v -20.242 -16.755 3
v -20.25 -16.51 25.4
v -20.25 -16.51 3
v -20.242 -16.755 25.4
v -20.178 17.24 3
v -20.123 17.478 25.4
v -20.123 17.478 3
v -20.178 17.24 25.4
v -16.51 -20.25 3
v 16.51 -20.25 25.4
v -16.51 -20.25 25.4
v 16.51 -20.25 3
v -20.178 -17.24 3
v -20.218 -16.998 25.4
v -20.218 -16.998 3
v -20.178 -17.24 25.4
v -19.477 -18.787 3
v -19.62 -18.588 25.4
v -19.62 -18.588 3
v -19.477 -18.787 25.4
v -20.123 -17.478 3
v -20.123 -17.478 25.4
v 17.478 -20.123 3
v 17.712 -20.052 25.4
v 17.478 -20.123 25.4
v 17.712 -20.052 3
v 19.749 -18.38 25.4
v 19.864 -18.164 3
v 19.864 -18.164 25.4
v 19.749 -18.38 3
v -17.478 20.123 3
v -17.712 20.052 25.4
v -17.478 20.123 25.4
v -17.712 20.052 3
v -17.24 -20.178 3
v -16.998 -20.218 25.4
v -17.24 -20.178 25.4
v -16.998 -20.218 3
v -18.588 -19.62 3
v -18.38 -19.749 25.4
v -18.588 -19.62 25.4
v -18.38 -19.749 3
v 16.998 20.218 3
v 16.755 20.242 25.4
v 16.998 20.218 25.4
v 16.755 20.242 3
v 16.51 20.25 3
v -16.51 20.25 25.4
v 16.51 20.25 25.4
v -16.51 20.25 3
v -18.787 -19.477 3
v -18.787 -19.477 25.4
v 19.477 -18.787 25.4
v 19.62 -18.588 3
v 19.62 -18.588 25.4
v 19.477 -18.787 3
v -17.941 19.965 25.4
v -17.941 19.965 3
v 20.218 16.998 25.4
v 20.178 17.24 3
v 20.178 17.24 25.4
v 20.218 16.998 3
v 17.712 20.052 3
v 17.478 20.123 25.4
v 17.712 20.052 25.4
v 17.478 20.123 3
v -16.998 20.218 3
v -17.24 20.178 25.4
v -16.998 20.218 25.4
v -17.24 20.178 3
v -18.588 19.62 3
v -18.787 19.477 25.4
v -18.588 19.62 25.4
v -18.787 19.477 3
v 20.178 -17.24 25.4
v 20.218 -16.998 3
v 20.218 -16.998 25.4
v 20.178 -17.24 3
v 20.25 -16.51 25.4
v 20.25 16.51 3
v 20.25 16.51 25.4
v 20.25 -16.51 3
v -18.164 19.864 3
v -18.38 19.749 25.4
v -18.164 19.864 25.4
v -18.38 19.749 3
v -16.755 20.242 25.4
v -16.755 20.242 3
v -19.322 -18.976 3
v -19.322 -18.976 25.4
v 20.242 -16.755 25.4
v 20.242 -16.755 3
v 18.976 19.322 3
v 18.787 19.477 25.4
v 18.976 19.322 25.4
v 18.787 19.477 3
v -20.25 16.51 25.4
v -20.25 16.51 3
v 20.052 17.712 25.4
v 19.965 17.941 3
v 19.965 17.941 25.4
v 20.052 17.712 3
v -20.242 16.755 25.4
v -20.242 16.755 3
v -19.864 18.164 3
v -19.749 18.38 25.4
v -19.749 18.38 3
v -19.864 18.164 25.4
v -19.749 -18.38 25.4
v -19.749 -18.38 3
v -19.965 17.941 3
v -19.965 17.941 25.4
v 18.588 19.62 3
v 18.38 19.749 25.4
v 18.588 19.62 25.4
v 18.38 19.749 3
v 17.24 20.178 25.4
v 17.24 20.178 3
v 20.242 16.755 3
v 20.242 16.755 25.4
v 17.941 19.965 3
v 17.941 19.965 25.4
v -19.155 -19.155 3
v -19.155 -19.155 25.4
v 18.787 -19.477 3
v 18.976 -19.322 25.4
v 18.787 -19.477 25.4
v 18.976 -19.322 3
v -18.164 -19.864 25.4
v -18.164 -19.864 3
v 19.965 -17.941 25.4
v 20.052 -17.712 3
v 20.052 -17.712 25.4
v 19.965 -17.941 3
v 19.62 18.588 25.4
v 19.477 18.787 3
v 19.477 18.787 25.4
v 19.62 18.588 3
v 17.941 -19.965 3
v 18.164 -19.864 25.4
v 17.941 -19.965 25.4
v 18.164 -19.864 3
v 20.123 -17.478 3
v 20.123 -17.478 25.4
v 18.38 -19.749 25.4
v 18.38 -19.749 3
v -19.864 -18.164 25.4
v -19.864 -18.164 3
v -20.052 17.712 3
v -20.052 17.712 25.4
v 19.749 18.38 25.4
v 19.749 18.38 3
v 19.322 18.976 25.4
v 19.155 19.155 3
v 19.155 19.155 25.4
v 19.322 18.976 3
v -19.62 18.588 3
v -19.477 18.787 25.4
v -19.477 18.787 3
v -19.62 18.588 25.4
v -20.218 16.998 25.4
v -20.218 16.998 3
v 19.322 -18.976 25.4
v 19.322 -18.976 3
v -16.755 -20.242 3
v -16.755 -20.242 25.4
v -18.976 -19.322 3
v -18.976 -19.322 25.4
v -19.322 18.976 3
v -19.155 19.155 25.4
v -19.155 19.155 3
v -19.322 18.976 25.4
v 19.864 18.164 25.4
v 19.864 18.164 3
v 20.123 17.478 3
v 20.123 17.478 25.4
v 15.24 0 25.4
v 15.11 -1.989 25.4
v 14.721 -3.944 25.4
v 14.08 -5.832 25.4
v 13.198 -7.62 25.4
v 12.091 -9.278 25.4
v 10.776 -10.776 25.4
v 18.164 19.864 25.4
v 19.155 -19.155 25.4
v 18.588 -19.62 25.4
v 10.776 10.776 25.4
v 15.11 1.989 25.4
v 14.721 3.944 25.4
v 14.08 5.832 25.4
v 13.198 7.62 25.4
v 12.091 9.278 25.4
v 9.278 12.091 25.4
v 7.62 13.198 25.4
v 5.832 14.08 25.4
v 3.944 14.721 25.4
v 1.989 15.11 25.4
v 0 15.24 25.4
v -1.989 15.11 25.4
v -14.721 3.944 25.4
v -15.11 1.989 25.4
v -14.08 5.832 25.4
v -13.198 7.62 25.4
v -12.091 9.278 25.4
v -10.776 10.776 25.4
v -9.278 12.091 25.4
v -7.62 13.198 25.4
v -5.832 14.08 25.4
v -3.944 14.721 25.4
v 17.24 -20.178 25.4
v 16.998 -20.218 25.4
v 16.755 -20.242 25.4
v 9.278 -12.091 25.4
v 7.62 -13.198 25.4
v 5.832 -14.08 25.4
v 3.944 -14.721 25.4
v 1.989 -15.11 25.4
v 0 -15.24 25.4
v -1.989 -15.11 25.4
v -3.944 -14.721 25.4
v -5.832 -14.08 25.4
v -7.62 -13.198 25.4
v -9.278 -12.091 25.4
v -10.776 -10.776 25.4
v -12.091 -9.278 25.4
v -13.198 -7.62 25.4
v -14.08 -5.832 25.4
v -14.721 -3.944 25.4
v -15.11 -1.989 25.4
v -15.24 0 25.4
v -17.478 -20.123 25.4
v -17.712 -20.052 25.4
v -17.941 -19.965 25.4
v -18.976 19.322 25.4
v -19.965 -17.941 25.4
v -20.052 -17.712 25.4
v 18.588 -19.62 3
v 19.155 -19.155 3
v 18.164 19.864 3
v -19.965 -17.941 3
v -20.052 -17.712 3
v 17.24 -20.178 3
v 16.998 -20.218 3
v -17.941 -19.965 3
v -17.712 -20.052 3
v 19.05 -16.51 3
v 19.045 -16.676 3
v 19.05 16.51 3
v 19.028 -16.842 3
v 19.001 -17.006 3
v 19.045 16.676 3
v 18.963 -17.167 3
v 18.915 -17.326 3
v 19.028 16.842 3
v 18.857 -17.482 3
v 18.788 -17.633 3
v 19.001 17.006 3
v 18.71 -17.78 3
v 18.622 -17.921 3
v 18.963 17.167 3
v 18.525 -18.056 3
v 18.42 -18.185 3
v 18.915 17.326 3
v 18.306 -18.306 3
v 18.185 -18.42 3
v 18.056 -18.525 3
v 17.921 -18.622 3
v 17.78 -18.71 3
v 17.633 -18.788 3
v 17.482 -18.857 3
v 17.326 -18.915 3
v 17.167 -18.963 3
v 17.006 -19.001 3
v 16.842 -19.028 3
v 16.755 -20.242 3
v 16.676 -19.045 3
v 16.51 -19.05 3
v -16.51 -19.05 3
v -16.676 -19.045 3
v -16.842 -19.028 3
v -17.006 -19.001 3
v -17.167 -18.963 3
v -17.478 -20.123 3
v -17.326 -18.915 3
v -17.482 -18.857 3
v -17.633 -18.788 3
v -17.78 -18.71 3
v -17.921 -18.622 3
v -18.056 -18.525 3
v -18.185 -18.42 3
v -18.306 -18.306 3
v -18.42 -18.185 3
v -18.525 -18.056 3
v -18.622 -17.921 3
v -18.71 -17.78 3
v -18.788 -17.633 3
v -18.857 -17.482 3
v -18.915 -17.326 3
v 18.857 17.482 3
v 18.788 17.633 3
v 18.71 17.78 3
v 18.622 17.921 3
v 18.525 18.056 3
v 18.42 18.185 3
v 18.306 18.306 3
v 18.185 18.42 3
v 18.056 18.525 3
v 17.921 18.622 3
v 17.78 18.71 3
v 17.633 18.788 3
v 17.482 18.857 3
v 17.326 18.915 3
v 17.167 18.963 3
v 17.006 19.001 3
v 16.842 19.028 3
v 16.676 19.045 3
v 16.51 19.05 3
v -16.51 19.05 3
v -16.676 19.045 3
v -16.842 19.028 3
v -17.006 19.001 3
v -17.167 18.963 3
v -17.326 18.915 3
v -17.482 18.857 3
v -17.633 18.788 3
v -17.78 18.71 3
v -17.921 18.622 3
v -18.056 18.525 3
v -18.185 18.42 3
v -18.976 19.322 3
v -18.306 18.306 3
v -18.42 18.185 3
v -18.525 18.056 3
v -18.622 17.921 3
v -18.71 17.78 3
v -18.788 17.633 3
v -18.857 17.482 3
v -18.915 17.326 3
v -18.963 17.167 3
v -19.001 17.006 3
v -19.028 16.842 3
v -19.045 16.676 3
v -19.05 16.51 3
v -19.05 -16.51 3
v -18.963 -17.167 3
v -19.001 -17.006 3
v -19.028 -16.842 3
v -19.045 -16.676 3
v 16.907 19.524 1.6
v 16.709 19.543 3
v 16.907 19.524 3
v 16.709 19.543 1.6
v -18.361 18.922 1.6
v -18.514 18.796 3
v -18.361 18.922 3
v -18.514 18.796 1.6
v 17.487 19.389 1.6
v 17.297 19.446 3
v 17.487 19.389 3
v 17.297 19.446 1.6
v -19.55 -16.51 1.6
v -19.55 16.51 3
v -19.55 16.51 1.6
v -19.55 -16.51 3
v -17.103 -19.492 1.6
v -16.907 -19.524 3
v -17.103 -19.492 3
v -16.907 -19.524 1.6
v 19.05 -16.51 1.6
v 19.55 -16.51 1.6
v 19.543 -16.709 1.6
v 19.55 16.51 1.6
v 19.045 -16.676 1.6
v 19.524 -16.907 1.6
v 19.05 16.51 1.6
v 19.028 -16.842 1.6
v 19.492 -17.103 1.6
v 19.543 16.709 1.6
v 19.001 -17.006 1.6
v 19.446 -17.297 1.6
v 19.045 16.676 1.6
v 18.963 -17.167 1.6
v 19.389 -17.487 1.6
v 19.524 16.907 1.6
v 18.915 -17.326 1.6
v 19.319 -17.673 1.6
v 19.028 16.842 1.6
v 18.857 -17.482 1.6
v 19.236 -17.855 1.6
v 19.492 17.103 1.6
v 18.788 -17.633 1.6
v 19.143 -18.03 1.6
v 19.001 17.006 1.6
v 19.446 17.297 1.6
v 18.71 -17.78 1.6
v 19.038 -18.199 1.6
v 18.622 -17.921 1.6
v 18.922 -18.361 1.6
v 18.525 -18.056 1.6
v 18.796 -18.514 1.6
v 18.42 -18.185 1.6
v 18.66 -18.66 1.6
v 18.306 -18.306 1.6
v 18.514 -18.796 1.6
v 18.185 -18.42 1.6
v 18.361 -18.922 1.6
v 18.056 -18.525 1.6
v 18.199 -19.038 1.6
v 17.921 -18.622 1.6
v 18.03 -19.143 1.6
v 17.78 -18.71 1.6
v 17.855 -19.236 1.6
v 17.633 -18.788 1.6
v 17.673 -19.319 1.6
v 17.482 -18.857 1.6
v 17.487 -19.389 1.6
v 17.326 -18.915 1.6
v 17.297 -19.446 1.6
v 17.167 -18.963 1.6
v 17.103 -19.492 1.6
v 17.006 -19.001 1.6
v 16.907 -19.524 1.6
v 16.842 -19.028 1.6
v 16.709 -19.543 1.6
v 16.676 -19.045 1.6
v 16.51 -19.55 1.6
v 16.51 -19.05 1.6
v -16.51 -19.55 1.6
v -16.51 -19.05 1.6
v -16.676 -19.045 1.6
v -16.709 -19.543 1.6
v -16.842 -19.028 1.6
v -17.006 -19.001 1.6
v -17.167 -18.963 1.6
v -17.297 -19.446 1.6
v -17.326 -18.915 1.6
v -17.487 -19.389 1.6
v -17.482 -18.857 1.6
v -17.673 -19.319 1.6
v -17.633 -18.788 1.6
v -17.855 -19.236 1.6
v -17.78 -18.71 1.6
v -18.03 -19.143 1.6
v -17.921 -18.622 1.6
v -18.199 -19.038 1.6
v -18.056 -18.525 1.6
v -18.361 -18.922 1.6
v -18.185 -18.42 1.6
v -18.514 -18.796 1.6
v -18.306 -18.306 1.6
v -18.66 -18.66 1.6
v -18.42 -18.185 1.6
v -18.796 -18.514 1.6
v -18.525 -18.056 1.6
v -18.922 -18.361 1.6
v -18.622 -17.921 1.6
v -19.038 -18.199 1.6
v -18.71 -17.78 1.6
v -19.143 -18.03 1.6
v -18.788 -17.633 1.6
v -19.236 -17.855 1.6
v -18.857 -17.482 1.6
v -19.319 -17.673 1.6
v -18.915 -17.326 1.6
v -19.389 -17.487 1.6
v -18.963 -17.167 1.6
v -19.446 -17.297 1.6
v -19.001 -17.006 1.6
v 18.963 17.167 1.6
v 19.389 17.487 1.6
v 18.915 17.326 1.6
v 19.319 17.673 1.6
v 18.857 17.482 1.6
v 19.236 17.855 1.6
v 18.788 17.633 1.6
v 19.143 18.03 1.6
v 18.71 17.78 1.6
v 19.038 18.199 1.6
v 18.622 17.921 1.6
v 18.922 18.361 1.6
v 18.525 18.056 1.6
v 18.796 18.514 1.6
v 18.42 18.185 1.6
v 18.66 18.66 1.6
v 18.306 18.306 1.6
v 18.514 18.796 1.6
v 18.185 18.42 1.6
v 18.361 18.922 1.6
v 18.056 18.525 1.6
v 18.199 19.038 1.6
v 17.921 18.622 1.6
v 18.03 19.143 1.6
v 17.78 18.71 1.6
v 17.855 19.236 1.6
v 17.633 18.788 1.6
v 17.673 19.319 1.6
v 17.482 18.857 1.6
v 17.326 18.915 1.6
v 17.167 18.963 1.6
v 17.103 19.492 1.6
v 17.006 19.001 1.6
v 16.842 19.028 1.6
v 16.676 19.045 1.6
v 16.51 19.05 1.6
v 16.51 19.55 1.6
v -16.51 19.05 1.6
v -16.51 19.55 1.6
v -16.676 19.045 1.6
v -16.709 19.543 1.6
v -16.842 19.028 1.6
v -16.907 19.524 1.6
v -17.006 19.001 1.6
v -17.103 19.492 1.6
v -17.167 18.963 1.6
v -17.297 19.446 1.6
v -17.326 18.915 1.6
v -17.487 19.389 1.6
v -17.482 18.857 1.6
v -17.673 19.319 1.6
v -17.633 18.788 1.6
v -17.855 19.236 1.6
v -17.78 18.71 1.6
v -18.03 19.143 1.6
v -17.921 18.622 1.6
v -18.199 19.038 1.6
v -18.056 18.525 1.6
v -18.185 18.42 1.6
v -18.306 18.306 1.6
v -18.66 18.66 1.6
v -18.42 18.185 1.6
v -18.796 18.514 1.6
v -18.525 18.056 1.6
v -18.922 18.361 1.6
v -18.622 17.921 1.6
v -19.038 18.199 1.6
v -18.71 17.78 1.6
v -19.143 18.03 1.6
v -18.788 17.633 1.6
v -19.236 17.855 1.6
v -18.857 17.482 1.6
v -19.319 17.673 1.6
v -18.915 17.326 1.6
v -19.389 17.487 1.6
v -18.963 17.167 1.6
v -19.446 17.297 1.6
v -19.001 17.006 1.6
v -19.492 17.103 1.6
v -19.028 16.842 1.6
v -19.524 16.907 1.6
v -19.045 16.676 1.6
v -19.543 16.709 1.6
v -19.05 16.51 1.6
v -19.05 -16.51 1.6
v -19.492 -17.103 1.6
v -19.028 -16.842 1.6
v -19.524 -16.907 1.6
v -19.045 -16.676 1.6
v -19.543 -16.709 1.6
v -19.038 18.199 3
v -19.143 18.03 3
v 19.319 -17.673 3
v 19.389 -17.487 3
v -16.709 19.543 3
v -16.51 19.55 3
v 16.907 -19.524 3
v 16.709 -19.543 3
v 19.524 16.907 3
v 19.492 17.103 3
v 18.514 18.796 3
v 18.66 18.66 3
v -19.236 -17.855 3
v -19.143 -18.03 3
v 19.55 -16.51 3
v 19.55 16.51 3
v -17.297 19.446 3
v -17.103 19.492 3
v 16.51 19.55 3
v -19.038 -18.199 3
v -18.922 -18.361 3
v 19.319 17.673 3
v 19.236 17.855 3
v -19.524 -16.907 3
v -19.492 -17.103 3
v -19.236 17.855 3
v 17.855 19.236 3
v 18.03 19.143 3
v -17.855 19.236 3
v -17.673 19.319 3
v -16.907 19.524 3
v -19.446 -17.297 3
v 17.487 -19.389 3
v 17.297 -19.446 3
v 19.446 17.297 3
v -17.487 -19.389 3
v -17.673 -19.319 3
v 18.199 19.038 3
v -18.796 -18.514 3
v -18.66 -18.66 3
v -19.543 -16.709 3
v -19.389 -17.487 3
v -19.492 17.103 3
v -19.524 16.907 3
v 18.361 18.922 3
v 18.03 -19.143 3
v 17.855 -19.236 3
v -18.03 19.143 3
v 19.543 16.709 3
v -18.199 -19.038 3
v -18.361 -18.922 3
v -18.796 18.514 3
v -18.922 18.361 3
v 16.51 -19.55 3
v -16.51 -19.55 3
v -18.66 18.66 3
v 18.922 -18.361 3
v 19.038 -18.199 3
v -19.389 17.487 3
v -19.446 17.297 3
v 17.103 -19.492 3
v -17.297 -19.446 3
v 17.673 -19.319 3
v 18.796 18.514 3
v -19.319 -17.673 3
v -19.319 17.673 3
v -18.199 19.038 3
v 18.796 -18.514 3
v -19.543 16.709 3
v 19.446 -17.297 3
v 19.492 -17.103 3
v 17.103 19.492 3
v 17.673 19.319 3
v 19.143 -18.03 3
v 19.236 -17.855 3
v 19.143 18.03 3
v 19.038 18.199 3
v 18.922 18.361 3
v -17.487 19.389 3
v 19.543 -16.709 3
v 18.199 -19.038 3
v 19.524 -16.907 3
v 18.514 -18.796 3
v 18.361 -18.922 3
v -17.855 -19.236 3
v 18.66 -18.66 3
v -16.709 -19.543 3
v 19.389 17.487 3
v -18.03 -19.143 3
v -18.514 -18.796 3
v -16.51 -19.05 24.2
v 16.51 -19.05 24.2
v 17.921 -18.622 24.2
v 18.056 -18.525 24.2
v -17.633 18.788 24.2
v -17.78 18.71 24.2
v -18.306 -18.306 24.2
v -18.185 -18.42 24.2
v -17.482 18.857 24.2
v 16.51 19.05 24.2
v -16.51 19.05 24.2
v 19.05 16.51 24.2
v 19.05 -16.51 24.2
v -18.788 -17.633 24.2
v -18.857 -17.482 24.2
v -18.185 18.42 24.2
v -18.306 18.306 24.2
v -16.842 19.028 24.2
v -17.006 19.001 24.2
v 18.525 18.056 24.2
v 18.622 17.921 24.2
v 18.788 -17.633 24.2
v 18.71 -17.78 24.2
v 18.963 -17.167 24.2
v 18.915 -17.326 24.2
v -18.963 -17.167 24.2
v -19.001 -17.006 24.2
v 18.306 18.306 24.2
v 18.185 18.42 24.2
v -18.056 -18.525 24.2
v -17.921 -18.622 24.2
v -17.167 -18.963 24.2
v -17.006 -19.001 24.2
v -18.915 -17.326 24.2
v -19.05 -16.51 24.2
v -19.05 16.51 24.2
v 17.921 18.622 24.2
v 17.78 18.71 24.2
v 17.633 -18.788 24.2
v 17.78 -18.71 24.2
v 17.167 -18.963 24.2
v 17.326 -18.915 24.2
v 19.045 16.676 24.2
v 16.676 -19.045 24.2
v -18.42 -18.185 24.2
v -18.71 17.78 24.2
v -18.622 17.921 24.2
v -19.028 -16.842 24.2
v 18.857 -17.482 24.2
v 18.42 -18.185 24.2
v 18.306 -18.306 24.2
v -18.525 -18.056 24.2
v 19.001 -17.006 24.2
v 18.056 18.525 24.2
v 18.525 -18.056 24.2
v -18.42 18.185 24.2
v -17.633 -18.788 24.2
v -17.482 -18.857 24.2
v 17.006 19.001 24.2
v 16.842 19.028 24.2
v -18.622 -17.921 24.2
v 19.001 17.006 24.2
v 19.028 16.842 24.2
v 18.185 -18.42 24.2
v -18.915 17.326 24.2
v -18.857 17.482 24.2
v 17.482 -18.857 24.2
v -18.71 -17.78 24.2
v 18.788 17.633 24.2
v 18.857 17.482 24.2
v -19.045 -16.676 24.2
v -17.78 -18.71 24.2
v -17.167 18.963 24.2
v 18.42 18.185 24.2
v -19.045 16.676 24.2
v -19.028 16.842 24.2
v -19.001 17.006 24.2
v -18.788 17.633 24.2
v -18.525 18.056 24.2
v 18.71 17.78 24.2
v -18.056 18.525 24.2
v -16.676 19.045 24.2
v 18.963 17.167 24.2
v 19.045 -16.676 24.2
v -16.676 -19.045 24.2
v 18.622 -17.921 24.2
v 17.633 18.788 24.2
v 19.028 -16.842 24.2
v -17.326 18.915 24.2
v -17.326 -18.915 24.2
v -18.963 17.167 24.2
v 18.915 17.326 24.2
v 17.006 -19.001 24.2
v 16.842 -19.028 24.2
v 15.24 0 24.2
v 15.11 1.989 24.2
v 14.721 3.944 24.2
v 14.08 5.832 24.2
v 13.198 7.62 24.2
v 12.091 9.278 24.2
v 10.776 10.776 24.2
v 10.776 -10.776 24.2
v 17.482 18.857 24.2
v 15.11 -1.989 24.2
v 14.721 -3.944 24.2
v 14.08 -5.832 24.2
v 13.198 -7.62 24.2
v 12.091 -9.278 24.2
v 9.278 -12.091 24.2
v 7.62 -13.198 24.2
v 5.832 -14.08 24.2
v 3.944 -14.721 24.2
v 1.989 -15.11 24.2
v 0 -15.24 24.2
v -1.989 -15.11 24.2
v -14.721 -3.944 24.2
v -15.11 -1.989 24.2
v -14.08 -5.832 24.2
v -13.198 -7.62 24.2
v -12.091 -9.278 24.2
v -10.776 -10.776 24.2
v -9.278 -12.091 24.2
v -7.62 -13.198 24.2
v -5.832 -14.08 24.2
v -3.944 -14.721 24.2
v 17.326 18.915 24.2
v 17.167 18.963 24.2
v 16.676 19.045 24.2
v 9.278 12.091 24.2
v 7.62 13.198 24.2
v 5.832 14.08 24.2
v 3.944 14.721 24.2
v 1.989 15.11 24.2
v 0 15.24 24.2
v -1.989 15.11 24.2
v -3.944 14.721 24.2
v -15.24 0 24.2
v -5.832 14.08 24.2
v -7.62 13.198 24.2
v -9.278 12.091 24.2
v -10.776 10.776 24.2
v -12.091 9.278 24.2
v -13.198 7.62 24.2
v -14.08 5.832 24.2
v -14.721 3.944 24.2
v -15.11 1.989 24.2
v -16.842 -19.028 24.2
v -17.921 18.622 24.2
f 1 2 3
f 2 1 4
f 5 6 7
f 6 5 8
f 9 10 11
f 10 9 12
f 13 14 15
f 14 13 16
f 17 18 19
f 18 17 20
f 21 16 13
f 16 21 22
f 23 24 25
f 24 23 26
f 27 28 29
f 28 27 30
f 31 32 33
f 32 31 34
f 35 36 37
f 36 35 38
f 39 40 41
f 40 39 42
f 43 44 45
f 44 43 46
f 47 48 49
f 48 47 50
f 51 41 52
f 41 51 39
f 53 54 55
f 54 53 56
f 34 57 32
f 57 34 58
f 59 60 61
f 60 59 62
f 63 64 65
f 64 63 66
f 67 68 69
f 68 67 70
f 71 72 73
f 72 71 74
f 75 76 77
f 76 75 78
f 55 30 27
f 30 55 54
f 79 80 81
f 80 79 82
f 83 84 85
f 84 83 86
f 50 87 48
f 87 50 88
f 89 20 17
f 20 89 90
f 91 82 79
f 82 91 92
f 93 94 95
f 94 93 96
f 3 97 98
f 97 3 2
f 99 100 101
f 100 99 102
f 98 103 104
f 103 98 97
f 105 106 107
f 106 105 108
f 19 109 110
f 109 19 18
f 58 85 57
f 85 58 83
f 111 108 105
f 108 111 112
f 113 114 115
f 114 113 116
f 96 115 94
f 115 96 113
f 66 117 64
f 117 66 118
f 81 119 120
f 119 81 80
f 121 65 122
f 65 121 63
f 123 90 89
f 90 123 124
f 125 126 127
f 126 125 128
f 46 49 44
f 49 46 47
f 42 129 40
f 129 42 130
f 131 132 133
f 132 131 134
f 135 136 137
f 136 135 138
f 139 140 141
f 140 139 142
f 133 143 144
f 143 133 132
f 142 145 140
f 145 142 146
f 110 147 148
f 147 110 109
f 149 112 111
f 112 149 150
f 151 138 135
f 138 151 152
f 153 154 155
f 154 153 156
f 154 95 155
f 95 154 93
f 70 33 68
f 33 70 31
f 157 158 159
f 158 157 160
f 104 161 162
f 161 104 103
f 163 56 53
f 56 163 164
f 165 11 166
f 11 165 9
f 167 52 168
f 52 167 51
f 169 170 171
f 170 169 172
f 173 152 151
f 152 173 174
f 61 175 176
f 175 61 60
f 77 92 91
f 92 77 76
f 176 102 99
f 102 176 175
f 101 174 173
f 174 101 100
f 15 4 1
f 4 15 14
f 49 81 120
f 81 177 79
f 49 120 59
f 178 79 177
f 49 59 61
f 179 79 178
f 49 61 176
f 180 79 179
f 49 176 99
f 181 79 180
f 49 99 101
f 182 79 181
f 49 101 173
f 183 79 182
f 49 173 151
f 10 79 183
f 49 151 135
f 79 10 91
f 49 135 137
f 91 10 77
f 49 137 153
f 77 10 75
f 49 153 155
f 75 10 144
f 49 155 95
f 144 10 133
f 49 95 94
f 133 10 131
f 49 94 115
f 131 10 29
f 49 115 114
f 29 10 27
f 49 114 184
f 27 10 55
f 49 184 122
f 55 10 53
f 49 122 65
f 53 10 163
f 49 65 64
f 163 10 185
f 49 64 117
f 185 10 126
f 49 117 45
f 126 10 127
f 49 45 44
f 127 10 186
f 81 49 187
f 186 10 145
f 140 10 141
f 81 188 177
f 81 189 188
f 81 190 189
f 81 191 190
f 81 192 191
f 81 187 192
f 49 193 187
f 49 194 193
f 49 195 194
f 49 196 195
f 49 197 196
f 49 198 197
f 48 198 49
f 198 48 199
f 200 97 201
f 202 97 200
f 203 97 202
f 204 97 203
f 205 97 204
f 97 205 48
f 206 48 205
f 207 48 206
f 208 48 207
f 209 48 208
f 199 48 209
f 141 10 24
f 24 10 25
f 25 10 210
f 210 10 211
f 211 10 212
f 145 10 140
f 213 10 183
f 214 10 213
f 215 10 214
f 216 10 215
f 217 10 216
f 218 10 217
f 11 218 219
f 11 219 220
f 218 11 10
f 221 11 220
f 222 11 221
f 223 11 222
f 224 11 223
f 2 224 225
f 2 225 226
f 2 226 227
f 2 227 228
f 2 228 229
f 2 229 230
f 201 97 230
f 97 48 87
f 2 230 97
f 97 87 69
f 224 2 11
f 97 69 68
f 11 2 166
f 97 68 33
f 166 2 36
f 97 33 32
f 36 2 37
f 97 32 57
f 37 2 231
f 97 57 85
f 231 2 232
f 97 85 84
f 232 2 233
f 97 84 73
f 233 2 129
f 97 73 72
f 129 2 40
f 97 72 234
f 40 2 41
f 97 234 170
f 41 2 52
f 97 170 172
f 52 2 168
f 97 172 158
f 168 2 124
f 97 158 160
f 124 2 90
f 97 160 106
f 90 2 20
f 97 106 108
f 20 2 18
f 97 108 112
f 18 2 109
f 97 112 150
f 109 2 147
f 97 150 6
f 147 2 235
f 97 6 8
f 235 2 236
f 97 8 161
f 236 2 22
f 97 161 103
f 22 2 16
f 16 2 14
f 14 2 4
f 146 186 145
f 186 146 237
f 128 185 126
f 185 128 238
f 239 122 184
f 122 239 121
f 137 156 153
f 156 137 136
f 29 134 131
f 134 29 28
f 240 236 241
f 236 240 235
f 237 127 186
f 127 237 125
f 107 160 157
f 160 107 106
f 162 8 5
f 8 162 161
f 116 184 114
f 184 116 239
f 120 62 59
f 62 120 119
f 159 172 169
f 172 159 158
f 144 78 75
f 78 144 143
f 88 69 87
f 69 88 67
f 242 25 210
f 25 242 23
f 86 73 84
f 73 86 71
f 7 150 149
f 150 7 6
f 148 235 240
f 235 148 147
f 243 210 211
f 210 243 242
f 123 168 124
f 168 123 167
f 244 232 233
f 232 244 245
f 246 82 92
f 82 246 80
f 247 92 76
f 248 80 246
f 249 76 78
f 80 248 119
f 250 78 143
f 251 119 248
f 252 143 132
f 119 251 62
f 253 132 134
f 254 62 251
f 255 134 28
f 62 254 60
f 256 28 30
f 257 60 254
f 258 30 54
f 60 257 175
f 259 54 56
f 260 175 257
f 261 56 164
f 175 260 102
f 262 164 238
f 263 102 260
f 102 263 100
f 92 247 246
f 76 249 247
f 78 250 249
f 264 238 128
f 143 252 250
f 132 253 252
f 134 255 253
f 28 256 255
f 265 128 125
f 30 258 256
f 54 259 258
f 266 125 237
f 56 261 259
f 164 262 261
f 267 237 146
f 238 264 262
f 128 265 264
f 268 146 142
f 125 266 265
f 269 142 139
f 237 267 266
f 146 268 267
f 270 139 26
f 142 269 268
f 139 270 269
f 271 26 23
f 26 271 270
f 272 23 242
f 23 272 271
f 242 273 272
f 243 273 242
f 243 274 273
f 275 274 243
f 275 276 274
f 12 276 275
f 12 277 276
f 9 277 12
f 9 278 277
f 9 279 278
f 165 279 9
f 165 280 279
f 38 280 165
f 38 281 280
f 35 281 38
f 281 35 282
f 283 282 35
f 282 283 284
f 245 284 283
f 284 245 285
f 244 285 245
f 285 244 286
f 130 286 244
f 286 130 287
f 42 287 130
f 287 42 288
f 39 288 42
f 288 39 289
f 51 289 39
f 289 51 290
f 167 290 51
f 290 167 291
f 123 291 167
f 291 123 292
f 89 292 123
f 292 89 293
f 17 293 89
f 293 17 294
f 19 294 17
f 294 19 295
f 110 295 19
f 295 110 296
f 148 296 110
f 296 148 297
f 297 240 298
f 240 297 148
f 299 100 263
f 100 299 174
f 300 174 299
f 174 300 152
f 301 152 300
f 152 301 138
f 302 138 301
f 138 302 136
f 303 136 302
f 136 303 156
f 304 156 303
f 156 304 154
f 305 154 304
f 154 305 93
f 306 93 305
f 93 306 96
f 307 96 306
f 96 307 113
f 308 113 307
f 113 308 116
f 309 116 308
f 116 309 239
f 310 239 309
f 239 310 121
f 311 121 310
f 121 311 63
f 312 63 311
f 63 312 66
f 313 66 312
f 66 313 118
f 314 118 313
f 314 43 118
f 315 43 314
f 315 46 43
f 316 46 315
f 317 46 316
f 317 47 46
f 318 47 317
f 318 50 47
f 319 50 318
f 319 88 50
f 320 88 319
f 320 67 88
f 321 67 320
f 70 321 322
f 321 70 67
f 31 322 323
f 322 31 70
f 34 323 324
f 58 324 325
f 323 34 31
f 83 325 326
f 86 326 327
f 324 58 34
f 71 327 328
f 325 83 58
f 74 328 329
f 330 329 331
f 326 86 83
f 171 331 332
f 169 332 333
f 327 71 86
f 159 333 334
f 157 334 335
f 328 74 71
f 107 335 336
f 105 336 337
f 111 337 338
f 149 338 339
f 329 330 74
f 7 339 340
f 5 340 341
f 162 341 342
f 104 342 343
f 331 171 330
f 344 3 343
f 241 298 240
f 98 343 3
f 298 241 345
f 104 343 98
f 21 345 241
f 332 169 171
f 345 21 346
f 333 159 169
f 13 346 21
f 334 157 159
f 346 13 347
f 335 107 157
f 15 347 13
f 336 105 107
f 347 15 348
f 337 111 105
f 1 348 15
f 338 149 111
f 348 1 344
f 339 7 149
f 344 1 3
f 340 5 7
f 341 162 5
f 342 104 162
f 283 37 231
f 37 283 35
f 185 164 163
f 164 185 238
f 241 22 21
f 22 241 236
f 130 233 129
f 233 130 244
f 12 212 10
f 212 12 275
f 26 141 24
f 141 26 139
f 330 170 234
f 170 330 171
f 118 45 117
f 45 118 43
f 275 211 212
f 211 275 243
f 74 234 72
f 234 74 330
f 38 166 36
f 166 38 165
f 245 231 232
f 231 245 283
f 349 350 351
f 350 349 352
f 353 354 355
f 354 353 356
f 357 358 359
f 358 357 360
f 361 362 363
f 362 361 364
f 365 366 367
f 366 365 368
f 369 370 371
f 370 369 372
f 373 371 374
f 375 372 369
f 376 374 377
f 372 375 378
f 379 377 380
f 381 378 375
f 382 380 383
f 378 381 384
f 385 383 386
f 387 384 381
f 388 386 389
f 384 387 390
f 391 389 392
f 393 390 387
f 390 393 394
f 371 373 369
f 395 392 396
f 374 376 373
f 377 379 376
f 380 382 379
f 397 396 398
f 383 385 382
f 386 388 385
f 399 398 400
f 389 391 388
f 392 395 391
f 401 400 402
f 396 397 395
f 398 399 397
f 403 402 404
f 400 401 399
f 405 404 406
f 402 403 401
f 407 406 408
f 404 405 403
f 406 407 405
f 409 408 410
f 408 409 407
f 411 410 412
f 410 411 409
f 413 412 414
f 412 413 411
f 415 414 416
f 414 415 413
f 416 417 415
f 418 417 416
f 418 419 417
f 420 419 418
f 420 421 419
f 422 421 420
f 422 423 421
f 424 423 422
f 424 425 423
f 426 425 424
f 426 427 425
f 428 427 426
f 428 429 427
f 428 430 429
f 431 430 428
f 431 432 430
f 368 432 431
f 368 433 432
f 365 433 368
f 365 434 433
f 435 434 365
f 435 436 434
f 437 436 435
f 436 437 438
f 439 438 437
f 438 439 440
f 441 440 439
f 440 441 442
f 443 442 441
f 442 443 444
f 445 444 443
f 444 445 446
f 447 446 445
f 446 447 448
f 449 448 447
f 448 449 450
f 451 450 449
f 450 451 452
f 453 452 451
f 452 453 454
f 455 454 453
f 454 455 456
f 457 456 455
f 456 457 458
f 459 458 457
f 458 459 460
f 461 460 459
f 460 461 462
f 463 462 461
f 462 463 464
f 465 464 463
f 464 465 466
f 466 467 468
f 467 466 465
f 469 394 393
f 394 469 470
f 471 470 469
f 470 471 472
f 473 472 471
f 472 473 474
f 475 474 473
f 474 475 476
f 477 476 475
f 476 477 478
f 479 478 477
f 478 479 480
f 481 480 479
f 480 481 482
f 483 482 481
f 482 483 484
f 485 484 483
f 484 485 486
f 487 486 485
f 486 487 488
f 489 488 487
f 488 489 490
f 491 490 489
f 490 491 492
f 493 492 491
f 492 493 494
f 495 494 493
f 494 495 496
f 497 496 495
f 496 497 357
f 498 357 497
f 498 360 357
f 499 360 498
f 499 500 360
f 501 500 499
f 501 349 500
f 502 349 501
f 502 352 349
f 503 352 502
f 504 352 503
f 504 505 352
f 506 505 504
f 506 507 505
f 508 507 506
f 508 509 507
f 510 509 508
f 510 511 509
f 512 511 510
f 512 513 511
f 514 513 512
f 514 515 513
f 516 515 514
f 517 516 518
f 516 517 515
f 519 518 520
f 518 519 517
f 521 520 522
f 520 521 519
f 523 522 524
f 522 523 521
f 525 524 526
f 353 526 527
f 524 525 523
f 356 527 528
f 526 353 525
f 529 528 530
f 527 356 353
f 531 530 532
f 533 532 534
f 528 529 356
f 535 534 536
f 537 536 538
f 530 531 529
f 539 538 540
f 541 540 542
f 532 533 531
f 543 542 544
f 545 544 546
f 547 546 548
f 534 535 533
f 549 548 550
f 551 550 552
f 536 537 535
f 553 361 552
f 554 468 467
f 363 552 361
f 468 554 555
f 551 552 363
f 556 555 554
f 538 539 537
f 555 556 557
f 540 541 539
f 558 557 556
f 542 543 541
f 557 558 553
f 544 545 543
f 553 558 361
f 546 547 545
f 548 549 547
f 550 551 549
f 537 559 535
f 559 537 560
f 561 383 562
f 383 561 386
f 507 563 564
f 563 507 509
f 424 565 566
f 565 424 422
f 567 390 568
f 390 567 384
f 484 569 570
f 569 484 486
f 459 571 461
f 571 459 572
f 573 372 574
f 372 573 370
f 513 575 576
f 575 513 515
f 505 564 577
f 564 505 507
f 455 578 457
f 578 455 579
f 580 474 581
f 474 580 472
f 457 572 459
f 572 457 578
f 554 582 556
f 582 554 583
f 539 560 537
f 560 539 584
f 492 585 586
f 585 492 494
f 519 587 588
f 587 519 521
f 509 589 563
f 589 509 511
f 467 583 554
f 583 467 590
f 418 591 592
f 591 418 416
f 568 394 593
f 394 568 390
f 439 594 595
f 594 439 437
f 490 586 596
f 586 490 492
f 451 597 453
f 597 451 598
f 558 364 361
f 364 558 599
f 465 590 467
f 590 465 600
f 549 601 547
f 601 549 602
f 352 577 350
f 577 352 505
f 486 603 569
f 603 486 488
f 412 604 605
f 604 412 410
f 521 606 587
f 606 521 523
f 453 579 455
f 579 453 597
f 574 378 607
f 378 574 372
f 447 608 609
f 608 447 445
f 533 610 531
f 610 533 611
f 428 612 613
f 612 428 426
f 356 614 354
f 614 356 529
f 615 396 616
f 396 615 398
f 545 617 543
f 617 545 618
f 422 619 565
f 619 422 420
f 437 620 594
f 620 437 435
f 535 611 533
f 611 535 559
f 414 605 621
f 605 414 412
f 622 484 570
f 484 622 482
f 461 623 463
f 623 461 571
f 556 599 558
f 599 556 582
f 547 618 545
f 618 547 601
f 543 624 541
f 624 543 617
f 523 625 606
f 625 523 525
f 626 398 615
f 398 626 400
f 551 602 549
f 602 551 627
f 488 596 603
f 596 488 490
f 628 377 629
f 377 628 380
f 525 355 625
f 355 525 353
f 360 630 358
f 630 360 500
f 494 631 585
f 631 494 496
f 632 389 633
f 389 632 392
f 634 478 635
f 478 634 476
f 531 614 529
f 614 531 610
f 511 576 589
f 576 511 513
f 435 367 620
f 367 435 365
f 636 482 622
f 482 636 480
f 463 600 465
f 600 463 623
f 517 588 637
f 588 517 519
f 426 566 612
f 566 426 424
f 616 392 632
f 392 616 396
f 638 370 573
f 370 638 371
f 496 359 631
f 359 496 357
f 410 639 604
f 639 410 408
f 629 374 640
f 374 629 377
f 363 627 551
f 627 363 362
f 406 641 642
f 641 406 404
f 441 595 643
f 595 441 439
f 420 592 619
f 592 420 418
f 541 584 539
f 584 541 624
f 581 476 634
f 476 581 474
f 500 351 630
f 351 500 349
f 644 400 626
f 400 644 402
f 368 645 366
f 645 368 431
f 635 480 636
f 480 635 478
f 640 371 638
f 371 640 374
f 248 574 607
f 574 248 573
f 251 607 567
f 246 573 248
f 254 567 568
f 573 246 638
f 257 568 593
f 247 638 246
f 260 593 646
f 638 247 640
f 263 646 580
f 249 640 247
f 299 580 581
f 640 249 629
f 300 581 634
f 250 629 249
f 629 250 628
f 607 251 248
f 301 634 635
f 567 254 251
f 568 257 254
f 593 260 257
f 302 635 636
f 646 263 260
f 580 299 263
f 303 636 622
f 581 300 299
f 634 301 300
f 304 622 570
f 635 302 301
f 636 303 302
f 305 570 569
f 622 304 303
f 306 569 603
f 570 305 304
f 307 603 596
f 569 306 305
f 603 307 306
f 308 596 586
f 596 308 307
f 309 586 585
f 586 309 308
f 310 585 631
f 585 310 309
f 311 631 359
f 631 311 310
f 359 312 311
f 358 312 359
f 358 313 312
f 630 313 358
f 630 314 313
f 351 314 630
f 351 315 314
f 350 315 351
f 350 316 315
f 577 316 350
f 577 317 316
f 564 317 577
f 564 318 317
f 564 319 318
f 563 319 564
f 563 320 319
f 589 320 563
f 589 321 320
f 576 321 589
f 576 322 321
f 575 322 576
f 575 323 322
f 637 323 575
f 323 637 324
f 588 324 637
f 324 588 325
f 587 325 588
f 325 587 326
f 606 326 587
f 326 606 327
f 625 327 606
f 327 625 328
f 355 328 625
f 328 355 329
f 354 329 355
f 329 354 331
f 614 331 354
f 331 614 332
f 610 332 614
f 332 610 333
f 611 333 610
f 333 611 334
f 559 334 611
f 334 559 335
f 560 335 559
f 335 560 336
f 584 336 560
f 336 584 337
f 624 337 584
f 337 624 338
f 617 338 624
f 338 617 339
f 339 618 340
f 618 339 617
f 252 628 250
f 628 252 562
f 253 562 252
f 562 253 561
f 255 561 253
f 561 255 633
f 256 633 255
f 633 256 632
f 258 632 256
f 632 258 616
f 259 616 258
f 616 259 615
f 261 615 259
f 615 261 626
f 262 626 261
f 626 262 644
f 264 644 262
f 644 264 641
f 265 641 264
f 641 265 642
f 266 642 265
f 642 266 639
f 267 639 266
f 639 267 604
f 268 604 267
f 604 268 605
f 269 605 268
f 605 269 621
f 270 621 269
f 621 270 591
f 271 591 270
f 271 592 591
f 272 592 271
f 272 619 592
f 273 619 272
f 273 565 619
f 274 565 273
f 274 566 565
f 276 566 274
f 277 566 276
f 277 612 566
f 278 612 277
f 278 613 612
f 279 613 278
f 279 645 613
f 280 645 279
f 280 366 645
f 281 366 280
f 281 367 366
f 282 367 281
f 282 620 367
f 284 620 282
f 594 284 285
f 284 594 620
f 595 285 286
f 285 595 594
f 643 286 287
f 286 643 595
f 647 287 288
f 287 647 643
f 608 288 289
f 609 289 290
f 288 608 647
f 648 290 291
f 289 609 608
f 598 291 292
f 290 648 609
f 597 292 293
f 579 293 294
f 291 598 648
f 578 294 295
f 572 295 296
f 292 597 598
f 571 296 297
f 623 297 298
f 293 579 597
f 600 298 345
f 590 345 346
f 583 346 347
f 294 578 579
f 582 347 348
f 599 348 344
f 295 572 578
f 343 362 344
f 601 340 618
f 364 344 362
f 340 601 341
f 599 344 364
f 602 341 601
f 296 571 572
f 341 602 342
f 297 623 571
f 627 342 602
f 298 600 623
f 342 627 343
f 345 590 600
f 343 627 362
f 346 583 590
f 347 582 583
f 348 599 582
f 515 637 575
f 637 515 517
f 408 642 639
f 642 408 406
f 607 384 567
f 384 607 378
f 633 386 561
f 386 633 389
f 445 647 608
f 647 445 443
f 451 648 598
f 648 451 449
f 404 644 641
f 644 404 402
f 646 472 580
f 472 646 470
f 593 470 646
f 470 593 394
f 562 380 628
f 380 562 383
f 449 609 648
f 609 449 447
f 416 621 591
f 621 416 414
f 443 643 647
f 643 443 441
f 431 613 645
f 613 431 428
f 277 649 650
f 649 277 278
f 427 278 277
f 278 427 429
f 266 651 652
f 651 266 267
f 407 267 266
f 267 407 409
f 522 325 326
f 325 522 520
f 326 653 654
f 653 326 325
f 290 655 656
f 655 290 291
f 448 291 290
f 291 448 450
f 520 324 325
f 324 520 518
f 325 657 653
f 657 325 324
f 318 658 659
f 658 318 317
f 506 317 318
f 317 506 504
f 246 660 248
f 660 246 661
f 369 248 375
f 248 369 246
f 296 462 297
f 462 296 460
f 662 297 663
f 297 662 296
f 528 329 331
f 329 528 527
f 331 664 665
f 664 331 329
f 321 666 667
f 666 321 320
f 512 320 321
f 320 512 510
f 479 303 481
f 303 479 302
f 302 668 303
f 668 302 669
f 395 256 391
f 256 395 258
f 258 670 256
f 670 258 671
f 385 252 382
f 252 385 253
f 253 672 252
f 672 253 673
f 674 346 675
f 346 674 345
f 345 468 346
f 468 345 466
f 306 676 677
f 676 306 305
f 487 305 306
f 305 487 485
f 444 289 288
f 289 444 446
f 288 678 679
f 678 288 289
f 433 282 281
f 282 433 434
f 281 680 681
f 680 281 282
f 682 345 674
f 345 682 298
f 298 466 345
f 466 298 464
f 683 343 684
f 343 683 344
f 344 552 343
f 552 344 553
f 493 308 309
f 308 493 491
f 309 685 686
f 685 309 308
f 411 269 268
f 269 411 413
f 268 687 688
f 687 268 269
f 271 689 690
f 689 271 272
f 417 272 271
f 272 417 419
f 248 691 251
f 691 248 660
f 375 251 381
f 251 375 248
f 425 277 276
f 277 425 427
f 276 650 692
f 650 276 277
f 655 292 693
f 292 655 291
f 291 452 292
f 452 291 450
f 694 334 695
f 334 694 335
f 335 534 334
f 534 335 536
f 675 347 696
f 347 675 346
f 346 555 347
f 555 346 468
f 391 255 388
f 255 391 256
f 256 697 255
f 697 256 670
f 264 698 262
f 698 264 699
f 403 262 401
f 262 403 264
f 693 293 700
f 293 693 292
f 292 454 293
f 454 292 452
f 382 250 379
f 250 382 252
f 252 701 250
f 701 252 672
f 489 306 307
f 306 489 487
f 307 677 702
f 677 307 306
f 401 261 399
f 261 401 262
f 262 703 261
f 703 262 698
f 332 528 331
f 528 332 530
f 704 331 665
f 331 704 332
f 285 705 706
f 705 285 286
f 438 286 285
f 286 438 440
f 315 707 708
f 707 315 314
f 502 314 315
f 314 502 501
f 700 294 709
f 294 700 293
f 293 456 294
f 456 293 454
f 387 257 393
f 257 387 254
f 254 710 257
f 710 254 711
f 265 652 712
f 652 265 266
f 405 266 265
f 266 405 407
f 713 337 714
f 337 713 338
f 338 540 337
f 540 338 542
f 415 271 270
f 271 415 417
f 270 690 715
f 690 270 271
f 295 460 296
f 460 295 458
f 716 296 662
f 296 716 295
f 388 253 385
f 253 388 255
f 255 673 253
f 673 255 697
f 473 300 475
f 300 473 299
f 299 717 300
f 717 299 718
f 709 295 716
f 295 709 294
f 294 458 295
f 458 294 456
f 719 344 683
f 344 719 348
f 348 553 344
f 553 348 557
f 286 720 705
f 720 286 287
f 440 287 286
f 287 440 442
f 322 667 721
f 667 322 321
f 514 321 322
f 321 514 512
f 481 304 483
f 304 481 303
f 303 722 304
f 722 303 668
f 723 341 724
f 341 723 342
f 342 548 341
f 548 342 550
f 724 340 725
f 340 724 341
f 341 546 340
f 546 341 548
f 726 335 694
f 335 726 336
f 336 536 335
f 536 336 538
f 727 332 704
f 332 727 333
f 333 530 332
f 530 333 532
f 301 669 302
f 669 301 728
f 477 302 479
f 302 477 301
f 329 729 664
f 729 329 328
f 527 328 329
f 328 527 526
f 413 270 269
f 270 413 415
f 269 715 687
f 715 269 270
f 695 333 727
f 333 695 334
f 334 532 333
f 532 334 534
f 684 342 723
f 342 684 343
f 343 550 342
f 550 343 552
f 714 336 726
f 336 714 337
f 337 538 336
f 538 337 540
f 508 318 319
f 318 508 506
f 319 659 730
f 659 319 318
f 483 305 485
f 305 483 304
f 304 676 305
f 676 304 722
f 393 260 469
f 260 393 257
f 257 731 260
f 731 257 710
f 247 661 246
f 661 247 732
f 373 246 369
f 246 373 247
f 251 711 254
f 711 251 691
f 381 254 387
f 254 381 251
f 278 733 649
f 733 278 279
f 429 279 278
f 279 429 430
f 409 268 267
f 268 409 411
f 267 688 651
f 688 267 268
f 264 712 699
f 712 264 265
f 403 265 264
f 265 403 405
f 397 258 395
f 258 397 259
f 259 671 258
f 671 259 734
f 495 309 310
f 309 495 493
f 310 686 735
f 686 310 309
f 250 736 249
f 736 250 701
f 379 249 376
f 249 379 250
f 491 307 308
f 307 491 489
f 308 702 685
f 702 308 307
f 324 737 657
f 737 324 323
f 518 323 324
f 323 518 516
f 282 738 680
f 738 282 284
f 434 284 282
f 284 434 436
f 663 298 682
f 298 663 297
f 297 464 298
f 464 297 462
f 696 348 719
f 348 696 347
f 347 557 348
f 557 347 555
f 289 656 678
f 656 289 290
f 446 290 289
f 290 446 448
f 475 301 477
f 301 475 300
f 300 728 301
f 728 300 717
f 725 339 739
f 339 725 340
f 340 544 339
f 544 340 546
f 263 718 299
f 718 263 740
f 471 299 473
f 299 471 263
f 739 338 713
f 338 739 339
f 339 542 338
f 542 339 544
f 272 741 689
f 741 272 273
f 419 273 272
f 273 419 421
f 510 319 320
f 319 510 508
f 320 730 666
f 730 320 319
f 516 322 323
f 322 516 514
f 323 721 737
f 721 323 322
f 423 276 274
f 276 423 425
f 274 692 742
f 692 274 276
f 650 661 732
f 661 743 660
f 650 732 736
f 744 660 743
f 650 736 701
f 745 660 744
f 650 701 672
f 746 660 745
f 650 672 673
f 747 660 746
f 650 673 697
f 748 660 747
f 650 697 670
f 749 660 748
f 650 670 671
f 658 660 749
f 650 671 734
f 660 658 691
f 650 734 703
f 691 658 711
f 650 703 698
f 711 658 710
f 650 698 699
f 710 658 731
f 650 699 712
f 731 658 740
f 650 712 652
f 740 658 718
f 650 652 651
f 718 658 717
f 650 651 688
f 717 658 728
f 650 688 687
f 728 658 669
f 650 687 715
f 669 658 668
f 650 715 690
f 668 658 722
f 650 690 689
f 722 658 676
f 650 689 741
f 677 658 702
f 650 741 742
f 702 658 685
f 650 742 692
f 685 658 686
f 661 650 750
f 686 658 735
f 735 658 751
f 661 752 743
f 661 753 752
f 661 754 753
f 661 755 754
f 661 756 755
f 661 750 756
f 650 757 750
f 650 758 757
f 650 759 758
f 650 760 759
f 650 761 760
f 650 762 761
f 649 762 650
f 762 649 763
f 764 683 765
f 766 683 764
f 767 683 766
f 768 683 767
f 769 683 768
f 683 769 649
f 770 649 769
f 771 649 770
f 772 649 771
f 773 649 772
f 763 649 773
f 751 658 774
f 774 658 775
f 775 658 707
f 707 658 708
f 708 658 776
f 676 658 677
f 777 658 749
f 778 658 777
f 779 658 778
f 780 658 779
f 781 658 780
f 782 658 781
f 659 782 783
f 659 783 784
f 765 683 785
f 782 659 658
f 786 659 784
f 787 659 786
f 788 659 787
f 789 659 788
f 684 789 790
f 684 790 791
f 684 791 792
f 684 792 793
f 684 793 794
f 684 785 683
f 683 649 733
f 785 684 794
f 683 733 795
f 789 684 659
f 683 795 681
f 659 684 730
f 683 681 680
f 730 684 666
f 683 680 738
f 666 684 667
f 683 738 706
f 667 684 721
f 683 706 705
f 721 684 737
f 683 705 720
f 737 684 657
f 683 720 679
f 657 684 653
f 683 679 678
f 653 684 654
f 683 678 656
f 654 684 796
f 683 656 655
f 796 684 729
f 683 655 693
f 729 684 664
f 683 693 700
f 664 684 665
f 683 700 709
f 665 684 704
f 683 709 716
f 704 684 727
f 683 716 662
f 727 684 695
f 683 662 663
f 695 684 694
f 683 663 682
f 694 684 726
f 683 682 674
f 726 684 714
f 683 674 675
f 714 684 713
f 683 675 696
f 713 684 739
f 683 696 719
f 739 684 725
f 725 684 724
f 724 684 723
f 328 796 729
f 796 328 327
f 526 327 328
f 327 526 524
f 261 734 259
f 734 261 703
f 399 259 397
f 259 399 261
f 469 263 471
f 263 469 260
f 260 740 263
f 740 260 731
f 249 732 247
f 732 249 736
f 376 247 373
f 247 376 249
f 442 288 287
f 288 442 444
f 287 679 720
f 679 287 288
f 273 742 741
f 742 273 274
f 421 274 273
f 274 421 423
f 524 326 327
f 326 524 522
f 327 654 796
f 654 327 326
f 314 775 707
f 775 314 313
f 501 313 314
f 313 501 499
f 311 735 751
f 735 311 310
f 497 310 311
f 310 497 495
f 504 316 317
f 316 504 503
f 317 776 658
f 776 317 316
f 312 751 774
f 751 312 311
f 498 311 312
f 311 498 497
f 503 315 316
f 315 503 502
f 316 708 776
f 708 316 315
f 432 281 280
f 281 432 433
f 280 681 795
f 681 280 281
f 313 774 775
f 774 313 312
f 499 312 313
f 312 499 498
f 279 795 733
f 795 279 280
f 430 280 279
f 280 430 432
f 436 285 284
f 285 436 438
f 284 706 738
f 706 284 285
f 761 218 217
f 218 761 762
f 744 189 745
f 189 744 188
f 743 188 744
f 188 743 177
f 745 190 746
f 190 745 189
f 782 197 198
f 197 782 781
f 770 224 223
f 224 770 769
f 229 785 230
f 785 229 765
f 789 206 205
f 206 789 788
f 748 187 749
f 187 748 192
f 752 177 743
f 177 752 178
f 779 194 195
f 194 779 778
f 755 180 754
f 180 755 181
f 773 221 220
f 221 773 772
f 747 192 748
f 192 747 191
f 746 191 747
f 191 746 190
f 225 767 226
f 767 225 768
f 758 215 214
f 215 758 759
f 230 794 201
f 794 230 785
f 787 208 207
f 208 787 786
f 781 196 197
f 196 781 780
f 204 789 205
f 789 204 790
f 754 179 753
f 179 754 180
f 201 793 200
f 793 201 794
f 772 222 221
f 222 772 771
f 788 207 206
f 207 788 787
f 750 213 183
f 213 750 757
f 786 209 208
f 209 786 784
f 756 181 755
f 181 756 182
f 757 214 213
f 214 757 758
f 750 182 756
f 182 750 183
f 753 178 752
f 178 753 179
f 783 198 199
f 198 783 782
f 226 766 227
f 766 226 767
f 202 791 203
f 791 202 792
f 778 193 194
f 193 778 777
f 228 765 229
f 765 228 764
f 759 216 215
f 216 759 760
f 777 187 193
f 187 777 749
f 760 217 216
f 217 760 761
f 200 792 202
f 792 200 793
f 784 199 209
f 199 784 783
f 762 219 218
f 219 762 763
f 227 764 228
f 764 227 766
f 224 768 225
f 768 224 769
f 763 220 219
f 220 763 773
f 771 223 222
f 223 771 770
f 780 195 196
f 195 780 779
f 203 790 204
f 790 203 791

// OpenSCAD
// file: shape-dimple.scad
// Draws a dimple
// -Joe Walnes

module dimple(radius, thickness, dent_height, steps=40) {
	module swish() {
		step = radius / steps;
		for(x = [-step:step:radius]) {
			hull() {
				translate([x, 0.5 * dent_height * (1+cos(180 * x/radius)), 0]) circle(r=thickness/2, $fn=0);
				translate([x + step, 0.5 * dent_height * (1+cos(180 * (x + step)/radius)), 0]) circle(r=thickness/2, $fn=0);
			}
		}
	}
	rotate_extrude(convexity = 10) {
		translate([0, thickness / 2, 0]) swish();
	}
}


//translate([0, 0, 4]) cylinder(r=8, h=1);
dimple(8, 1, -3);
// file: shape-rounded-cube.scad
// Draws a cube with the vertical edges rounded.
// -Joe Walnes

module rounded_cube(width, depth, height, corner_radius) {
	translate([corner_radius, corner_radius, 0]) {
		minkowski() {
			cube([width - corner_radius * 2, depth - corner_radius * 2, height / 2]);	
			cylinder(r=corner_radius, h=height / 2);
		}
	}
}


// Example
$fn = 96; // Increase resolution of arc segments
rounded_cube(8, 8, 6, 2);
// file: dimensions.scad
// TimeLantern
// ======
// This file contains all the dimensions used in the TimeLantern.
// -Joe Walnes

// Magic OpenSCAD variable to improve the number of segments used 
// in circles.
// High values give smoother curves. Lower values render quickly.
$fn = 48;
//$fn = 96; // Smooth
//$fn = 12; // Fast

function mm(m) = m;
function inches(i) = mm(i) * 25.4; // inches -> mm

// --- PCB ---

pcb_width = inches(1.5);
pcb_thickness = inches(0.063);
pcb_corner_radius = inches(0.1);
pcb_hole_radius = inches(0.04);

// --- PCB components ---

lightbox_size = mm(10.16);

usb_width = mm(8.1); // 7.5 + 0.6 for tabs
usb_depth = mm(5);
usb_height = mm(2.8);

sensor_width = mm(4);
sensor_depth = mm(2);
sensor_height = mm(1.05);
sensor_gap_below = mm(1);
second_sensor_offset = inches(0.4);

// --- Base ---

outer_wall = mm(1.2); // take into account max USB male connector protusion. 
lip_height = mm(3);
lip_padding = mm(0.5);

base_height = inches(0.5);
base_floor_thickness = inches(0.2);

standoff_height = inches(0.2); // leave enough room for USB connector and tallest component
standoff_width = inches(0.1);
standoff_corner_radius = inches(0.1);
standoff_hole_radius = inches(0.02);

light_tube_radius = inches(0.1);
light_tube_hole_radius = inches(0.05);
light_tube_clearance_top = inches(0.1);

// Prototype uses these:
// http://www.amazon.com/gp/product/B003CIR2XU/
foot_pad_radius = inches(0.25) / 2;
foot_pad_height = inches(0.03);

// --- Lid ---

lid_height = inches(1);
lid_thickness = outer_wall;

dimple_radius = inches(0.6);
dimple_height= inches(0.2);
// main file
// TimeLantern
// ========
// Transparent lid.
// - Joe Walnes (original design by Andrew Kim)

include <dimensions.scad>;
use <shape-rounded-cube.scad>;
use <shape-dimple.scad>;

// Disable dimple to speed up rendering.
has_dimple = true;

module lid() {
	outer_width = pcb_width + outer_wall * 2;
	lid_lip_height = lip_height - pcb_thickness;
	lid_lip_thickness = mm(0.5); // TODO
	lid_lip_groove = outer_wall - lid_lip_thickness;
	difference() {
		union() {
			// Solid cube, without lip
			translate([-outer_width / 2, -outer_width / 2, pcb_thickness + lid_lip_height]) {
				rounded_cube(outer_width, outer_width,
					lid_height - pcb_thickness - lid_lip_height, pcb_corner_radius + outer_wall);
			}
			// Inner lip
			translate([-outer_width / 2 + lid_lip_groove, -outer_width / 2 + lid_lip_groove, pcb_thickness]) {
				rounded_cube(outer_width - lid_lip_groove * 2, outer_width - lid_lip_groove * 2,
					lid_lip_height, pcb_corner_radius + outer_wall - lid_lip_groove);
			}
		}
		// Hollow it out
		translate([-outer_width / 2 + lid_thickness, -outer_width / 2 + lid_thickness, pcb_thickness]) {
			rounded_cube(outer_width - lid_thickness * 2, outer_width - lid_thickness * 2, 
				lid_height - pcb_thickness - lid_thickness, pcb_corner_radius + outer_wall - lid_thickness);
		}
		// Hole for dimple
		if (has_dimple) {
			cylinder(r=dimple_radius, h=outer_wall, 100);
		}
	}
	// Dimple
	if (has_dimple) {
		translate([0, 0, lid_height - outer_wall]) {
			dimple(dimple_radius, outer_wall, -dimple_height);
		}
	}
}

lid();
